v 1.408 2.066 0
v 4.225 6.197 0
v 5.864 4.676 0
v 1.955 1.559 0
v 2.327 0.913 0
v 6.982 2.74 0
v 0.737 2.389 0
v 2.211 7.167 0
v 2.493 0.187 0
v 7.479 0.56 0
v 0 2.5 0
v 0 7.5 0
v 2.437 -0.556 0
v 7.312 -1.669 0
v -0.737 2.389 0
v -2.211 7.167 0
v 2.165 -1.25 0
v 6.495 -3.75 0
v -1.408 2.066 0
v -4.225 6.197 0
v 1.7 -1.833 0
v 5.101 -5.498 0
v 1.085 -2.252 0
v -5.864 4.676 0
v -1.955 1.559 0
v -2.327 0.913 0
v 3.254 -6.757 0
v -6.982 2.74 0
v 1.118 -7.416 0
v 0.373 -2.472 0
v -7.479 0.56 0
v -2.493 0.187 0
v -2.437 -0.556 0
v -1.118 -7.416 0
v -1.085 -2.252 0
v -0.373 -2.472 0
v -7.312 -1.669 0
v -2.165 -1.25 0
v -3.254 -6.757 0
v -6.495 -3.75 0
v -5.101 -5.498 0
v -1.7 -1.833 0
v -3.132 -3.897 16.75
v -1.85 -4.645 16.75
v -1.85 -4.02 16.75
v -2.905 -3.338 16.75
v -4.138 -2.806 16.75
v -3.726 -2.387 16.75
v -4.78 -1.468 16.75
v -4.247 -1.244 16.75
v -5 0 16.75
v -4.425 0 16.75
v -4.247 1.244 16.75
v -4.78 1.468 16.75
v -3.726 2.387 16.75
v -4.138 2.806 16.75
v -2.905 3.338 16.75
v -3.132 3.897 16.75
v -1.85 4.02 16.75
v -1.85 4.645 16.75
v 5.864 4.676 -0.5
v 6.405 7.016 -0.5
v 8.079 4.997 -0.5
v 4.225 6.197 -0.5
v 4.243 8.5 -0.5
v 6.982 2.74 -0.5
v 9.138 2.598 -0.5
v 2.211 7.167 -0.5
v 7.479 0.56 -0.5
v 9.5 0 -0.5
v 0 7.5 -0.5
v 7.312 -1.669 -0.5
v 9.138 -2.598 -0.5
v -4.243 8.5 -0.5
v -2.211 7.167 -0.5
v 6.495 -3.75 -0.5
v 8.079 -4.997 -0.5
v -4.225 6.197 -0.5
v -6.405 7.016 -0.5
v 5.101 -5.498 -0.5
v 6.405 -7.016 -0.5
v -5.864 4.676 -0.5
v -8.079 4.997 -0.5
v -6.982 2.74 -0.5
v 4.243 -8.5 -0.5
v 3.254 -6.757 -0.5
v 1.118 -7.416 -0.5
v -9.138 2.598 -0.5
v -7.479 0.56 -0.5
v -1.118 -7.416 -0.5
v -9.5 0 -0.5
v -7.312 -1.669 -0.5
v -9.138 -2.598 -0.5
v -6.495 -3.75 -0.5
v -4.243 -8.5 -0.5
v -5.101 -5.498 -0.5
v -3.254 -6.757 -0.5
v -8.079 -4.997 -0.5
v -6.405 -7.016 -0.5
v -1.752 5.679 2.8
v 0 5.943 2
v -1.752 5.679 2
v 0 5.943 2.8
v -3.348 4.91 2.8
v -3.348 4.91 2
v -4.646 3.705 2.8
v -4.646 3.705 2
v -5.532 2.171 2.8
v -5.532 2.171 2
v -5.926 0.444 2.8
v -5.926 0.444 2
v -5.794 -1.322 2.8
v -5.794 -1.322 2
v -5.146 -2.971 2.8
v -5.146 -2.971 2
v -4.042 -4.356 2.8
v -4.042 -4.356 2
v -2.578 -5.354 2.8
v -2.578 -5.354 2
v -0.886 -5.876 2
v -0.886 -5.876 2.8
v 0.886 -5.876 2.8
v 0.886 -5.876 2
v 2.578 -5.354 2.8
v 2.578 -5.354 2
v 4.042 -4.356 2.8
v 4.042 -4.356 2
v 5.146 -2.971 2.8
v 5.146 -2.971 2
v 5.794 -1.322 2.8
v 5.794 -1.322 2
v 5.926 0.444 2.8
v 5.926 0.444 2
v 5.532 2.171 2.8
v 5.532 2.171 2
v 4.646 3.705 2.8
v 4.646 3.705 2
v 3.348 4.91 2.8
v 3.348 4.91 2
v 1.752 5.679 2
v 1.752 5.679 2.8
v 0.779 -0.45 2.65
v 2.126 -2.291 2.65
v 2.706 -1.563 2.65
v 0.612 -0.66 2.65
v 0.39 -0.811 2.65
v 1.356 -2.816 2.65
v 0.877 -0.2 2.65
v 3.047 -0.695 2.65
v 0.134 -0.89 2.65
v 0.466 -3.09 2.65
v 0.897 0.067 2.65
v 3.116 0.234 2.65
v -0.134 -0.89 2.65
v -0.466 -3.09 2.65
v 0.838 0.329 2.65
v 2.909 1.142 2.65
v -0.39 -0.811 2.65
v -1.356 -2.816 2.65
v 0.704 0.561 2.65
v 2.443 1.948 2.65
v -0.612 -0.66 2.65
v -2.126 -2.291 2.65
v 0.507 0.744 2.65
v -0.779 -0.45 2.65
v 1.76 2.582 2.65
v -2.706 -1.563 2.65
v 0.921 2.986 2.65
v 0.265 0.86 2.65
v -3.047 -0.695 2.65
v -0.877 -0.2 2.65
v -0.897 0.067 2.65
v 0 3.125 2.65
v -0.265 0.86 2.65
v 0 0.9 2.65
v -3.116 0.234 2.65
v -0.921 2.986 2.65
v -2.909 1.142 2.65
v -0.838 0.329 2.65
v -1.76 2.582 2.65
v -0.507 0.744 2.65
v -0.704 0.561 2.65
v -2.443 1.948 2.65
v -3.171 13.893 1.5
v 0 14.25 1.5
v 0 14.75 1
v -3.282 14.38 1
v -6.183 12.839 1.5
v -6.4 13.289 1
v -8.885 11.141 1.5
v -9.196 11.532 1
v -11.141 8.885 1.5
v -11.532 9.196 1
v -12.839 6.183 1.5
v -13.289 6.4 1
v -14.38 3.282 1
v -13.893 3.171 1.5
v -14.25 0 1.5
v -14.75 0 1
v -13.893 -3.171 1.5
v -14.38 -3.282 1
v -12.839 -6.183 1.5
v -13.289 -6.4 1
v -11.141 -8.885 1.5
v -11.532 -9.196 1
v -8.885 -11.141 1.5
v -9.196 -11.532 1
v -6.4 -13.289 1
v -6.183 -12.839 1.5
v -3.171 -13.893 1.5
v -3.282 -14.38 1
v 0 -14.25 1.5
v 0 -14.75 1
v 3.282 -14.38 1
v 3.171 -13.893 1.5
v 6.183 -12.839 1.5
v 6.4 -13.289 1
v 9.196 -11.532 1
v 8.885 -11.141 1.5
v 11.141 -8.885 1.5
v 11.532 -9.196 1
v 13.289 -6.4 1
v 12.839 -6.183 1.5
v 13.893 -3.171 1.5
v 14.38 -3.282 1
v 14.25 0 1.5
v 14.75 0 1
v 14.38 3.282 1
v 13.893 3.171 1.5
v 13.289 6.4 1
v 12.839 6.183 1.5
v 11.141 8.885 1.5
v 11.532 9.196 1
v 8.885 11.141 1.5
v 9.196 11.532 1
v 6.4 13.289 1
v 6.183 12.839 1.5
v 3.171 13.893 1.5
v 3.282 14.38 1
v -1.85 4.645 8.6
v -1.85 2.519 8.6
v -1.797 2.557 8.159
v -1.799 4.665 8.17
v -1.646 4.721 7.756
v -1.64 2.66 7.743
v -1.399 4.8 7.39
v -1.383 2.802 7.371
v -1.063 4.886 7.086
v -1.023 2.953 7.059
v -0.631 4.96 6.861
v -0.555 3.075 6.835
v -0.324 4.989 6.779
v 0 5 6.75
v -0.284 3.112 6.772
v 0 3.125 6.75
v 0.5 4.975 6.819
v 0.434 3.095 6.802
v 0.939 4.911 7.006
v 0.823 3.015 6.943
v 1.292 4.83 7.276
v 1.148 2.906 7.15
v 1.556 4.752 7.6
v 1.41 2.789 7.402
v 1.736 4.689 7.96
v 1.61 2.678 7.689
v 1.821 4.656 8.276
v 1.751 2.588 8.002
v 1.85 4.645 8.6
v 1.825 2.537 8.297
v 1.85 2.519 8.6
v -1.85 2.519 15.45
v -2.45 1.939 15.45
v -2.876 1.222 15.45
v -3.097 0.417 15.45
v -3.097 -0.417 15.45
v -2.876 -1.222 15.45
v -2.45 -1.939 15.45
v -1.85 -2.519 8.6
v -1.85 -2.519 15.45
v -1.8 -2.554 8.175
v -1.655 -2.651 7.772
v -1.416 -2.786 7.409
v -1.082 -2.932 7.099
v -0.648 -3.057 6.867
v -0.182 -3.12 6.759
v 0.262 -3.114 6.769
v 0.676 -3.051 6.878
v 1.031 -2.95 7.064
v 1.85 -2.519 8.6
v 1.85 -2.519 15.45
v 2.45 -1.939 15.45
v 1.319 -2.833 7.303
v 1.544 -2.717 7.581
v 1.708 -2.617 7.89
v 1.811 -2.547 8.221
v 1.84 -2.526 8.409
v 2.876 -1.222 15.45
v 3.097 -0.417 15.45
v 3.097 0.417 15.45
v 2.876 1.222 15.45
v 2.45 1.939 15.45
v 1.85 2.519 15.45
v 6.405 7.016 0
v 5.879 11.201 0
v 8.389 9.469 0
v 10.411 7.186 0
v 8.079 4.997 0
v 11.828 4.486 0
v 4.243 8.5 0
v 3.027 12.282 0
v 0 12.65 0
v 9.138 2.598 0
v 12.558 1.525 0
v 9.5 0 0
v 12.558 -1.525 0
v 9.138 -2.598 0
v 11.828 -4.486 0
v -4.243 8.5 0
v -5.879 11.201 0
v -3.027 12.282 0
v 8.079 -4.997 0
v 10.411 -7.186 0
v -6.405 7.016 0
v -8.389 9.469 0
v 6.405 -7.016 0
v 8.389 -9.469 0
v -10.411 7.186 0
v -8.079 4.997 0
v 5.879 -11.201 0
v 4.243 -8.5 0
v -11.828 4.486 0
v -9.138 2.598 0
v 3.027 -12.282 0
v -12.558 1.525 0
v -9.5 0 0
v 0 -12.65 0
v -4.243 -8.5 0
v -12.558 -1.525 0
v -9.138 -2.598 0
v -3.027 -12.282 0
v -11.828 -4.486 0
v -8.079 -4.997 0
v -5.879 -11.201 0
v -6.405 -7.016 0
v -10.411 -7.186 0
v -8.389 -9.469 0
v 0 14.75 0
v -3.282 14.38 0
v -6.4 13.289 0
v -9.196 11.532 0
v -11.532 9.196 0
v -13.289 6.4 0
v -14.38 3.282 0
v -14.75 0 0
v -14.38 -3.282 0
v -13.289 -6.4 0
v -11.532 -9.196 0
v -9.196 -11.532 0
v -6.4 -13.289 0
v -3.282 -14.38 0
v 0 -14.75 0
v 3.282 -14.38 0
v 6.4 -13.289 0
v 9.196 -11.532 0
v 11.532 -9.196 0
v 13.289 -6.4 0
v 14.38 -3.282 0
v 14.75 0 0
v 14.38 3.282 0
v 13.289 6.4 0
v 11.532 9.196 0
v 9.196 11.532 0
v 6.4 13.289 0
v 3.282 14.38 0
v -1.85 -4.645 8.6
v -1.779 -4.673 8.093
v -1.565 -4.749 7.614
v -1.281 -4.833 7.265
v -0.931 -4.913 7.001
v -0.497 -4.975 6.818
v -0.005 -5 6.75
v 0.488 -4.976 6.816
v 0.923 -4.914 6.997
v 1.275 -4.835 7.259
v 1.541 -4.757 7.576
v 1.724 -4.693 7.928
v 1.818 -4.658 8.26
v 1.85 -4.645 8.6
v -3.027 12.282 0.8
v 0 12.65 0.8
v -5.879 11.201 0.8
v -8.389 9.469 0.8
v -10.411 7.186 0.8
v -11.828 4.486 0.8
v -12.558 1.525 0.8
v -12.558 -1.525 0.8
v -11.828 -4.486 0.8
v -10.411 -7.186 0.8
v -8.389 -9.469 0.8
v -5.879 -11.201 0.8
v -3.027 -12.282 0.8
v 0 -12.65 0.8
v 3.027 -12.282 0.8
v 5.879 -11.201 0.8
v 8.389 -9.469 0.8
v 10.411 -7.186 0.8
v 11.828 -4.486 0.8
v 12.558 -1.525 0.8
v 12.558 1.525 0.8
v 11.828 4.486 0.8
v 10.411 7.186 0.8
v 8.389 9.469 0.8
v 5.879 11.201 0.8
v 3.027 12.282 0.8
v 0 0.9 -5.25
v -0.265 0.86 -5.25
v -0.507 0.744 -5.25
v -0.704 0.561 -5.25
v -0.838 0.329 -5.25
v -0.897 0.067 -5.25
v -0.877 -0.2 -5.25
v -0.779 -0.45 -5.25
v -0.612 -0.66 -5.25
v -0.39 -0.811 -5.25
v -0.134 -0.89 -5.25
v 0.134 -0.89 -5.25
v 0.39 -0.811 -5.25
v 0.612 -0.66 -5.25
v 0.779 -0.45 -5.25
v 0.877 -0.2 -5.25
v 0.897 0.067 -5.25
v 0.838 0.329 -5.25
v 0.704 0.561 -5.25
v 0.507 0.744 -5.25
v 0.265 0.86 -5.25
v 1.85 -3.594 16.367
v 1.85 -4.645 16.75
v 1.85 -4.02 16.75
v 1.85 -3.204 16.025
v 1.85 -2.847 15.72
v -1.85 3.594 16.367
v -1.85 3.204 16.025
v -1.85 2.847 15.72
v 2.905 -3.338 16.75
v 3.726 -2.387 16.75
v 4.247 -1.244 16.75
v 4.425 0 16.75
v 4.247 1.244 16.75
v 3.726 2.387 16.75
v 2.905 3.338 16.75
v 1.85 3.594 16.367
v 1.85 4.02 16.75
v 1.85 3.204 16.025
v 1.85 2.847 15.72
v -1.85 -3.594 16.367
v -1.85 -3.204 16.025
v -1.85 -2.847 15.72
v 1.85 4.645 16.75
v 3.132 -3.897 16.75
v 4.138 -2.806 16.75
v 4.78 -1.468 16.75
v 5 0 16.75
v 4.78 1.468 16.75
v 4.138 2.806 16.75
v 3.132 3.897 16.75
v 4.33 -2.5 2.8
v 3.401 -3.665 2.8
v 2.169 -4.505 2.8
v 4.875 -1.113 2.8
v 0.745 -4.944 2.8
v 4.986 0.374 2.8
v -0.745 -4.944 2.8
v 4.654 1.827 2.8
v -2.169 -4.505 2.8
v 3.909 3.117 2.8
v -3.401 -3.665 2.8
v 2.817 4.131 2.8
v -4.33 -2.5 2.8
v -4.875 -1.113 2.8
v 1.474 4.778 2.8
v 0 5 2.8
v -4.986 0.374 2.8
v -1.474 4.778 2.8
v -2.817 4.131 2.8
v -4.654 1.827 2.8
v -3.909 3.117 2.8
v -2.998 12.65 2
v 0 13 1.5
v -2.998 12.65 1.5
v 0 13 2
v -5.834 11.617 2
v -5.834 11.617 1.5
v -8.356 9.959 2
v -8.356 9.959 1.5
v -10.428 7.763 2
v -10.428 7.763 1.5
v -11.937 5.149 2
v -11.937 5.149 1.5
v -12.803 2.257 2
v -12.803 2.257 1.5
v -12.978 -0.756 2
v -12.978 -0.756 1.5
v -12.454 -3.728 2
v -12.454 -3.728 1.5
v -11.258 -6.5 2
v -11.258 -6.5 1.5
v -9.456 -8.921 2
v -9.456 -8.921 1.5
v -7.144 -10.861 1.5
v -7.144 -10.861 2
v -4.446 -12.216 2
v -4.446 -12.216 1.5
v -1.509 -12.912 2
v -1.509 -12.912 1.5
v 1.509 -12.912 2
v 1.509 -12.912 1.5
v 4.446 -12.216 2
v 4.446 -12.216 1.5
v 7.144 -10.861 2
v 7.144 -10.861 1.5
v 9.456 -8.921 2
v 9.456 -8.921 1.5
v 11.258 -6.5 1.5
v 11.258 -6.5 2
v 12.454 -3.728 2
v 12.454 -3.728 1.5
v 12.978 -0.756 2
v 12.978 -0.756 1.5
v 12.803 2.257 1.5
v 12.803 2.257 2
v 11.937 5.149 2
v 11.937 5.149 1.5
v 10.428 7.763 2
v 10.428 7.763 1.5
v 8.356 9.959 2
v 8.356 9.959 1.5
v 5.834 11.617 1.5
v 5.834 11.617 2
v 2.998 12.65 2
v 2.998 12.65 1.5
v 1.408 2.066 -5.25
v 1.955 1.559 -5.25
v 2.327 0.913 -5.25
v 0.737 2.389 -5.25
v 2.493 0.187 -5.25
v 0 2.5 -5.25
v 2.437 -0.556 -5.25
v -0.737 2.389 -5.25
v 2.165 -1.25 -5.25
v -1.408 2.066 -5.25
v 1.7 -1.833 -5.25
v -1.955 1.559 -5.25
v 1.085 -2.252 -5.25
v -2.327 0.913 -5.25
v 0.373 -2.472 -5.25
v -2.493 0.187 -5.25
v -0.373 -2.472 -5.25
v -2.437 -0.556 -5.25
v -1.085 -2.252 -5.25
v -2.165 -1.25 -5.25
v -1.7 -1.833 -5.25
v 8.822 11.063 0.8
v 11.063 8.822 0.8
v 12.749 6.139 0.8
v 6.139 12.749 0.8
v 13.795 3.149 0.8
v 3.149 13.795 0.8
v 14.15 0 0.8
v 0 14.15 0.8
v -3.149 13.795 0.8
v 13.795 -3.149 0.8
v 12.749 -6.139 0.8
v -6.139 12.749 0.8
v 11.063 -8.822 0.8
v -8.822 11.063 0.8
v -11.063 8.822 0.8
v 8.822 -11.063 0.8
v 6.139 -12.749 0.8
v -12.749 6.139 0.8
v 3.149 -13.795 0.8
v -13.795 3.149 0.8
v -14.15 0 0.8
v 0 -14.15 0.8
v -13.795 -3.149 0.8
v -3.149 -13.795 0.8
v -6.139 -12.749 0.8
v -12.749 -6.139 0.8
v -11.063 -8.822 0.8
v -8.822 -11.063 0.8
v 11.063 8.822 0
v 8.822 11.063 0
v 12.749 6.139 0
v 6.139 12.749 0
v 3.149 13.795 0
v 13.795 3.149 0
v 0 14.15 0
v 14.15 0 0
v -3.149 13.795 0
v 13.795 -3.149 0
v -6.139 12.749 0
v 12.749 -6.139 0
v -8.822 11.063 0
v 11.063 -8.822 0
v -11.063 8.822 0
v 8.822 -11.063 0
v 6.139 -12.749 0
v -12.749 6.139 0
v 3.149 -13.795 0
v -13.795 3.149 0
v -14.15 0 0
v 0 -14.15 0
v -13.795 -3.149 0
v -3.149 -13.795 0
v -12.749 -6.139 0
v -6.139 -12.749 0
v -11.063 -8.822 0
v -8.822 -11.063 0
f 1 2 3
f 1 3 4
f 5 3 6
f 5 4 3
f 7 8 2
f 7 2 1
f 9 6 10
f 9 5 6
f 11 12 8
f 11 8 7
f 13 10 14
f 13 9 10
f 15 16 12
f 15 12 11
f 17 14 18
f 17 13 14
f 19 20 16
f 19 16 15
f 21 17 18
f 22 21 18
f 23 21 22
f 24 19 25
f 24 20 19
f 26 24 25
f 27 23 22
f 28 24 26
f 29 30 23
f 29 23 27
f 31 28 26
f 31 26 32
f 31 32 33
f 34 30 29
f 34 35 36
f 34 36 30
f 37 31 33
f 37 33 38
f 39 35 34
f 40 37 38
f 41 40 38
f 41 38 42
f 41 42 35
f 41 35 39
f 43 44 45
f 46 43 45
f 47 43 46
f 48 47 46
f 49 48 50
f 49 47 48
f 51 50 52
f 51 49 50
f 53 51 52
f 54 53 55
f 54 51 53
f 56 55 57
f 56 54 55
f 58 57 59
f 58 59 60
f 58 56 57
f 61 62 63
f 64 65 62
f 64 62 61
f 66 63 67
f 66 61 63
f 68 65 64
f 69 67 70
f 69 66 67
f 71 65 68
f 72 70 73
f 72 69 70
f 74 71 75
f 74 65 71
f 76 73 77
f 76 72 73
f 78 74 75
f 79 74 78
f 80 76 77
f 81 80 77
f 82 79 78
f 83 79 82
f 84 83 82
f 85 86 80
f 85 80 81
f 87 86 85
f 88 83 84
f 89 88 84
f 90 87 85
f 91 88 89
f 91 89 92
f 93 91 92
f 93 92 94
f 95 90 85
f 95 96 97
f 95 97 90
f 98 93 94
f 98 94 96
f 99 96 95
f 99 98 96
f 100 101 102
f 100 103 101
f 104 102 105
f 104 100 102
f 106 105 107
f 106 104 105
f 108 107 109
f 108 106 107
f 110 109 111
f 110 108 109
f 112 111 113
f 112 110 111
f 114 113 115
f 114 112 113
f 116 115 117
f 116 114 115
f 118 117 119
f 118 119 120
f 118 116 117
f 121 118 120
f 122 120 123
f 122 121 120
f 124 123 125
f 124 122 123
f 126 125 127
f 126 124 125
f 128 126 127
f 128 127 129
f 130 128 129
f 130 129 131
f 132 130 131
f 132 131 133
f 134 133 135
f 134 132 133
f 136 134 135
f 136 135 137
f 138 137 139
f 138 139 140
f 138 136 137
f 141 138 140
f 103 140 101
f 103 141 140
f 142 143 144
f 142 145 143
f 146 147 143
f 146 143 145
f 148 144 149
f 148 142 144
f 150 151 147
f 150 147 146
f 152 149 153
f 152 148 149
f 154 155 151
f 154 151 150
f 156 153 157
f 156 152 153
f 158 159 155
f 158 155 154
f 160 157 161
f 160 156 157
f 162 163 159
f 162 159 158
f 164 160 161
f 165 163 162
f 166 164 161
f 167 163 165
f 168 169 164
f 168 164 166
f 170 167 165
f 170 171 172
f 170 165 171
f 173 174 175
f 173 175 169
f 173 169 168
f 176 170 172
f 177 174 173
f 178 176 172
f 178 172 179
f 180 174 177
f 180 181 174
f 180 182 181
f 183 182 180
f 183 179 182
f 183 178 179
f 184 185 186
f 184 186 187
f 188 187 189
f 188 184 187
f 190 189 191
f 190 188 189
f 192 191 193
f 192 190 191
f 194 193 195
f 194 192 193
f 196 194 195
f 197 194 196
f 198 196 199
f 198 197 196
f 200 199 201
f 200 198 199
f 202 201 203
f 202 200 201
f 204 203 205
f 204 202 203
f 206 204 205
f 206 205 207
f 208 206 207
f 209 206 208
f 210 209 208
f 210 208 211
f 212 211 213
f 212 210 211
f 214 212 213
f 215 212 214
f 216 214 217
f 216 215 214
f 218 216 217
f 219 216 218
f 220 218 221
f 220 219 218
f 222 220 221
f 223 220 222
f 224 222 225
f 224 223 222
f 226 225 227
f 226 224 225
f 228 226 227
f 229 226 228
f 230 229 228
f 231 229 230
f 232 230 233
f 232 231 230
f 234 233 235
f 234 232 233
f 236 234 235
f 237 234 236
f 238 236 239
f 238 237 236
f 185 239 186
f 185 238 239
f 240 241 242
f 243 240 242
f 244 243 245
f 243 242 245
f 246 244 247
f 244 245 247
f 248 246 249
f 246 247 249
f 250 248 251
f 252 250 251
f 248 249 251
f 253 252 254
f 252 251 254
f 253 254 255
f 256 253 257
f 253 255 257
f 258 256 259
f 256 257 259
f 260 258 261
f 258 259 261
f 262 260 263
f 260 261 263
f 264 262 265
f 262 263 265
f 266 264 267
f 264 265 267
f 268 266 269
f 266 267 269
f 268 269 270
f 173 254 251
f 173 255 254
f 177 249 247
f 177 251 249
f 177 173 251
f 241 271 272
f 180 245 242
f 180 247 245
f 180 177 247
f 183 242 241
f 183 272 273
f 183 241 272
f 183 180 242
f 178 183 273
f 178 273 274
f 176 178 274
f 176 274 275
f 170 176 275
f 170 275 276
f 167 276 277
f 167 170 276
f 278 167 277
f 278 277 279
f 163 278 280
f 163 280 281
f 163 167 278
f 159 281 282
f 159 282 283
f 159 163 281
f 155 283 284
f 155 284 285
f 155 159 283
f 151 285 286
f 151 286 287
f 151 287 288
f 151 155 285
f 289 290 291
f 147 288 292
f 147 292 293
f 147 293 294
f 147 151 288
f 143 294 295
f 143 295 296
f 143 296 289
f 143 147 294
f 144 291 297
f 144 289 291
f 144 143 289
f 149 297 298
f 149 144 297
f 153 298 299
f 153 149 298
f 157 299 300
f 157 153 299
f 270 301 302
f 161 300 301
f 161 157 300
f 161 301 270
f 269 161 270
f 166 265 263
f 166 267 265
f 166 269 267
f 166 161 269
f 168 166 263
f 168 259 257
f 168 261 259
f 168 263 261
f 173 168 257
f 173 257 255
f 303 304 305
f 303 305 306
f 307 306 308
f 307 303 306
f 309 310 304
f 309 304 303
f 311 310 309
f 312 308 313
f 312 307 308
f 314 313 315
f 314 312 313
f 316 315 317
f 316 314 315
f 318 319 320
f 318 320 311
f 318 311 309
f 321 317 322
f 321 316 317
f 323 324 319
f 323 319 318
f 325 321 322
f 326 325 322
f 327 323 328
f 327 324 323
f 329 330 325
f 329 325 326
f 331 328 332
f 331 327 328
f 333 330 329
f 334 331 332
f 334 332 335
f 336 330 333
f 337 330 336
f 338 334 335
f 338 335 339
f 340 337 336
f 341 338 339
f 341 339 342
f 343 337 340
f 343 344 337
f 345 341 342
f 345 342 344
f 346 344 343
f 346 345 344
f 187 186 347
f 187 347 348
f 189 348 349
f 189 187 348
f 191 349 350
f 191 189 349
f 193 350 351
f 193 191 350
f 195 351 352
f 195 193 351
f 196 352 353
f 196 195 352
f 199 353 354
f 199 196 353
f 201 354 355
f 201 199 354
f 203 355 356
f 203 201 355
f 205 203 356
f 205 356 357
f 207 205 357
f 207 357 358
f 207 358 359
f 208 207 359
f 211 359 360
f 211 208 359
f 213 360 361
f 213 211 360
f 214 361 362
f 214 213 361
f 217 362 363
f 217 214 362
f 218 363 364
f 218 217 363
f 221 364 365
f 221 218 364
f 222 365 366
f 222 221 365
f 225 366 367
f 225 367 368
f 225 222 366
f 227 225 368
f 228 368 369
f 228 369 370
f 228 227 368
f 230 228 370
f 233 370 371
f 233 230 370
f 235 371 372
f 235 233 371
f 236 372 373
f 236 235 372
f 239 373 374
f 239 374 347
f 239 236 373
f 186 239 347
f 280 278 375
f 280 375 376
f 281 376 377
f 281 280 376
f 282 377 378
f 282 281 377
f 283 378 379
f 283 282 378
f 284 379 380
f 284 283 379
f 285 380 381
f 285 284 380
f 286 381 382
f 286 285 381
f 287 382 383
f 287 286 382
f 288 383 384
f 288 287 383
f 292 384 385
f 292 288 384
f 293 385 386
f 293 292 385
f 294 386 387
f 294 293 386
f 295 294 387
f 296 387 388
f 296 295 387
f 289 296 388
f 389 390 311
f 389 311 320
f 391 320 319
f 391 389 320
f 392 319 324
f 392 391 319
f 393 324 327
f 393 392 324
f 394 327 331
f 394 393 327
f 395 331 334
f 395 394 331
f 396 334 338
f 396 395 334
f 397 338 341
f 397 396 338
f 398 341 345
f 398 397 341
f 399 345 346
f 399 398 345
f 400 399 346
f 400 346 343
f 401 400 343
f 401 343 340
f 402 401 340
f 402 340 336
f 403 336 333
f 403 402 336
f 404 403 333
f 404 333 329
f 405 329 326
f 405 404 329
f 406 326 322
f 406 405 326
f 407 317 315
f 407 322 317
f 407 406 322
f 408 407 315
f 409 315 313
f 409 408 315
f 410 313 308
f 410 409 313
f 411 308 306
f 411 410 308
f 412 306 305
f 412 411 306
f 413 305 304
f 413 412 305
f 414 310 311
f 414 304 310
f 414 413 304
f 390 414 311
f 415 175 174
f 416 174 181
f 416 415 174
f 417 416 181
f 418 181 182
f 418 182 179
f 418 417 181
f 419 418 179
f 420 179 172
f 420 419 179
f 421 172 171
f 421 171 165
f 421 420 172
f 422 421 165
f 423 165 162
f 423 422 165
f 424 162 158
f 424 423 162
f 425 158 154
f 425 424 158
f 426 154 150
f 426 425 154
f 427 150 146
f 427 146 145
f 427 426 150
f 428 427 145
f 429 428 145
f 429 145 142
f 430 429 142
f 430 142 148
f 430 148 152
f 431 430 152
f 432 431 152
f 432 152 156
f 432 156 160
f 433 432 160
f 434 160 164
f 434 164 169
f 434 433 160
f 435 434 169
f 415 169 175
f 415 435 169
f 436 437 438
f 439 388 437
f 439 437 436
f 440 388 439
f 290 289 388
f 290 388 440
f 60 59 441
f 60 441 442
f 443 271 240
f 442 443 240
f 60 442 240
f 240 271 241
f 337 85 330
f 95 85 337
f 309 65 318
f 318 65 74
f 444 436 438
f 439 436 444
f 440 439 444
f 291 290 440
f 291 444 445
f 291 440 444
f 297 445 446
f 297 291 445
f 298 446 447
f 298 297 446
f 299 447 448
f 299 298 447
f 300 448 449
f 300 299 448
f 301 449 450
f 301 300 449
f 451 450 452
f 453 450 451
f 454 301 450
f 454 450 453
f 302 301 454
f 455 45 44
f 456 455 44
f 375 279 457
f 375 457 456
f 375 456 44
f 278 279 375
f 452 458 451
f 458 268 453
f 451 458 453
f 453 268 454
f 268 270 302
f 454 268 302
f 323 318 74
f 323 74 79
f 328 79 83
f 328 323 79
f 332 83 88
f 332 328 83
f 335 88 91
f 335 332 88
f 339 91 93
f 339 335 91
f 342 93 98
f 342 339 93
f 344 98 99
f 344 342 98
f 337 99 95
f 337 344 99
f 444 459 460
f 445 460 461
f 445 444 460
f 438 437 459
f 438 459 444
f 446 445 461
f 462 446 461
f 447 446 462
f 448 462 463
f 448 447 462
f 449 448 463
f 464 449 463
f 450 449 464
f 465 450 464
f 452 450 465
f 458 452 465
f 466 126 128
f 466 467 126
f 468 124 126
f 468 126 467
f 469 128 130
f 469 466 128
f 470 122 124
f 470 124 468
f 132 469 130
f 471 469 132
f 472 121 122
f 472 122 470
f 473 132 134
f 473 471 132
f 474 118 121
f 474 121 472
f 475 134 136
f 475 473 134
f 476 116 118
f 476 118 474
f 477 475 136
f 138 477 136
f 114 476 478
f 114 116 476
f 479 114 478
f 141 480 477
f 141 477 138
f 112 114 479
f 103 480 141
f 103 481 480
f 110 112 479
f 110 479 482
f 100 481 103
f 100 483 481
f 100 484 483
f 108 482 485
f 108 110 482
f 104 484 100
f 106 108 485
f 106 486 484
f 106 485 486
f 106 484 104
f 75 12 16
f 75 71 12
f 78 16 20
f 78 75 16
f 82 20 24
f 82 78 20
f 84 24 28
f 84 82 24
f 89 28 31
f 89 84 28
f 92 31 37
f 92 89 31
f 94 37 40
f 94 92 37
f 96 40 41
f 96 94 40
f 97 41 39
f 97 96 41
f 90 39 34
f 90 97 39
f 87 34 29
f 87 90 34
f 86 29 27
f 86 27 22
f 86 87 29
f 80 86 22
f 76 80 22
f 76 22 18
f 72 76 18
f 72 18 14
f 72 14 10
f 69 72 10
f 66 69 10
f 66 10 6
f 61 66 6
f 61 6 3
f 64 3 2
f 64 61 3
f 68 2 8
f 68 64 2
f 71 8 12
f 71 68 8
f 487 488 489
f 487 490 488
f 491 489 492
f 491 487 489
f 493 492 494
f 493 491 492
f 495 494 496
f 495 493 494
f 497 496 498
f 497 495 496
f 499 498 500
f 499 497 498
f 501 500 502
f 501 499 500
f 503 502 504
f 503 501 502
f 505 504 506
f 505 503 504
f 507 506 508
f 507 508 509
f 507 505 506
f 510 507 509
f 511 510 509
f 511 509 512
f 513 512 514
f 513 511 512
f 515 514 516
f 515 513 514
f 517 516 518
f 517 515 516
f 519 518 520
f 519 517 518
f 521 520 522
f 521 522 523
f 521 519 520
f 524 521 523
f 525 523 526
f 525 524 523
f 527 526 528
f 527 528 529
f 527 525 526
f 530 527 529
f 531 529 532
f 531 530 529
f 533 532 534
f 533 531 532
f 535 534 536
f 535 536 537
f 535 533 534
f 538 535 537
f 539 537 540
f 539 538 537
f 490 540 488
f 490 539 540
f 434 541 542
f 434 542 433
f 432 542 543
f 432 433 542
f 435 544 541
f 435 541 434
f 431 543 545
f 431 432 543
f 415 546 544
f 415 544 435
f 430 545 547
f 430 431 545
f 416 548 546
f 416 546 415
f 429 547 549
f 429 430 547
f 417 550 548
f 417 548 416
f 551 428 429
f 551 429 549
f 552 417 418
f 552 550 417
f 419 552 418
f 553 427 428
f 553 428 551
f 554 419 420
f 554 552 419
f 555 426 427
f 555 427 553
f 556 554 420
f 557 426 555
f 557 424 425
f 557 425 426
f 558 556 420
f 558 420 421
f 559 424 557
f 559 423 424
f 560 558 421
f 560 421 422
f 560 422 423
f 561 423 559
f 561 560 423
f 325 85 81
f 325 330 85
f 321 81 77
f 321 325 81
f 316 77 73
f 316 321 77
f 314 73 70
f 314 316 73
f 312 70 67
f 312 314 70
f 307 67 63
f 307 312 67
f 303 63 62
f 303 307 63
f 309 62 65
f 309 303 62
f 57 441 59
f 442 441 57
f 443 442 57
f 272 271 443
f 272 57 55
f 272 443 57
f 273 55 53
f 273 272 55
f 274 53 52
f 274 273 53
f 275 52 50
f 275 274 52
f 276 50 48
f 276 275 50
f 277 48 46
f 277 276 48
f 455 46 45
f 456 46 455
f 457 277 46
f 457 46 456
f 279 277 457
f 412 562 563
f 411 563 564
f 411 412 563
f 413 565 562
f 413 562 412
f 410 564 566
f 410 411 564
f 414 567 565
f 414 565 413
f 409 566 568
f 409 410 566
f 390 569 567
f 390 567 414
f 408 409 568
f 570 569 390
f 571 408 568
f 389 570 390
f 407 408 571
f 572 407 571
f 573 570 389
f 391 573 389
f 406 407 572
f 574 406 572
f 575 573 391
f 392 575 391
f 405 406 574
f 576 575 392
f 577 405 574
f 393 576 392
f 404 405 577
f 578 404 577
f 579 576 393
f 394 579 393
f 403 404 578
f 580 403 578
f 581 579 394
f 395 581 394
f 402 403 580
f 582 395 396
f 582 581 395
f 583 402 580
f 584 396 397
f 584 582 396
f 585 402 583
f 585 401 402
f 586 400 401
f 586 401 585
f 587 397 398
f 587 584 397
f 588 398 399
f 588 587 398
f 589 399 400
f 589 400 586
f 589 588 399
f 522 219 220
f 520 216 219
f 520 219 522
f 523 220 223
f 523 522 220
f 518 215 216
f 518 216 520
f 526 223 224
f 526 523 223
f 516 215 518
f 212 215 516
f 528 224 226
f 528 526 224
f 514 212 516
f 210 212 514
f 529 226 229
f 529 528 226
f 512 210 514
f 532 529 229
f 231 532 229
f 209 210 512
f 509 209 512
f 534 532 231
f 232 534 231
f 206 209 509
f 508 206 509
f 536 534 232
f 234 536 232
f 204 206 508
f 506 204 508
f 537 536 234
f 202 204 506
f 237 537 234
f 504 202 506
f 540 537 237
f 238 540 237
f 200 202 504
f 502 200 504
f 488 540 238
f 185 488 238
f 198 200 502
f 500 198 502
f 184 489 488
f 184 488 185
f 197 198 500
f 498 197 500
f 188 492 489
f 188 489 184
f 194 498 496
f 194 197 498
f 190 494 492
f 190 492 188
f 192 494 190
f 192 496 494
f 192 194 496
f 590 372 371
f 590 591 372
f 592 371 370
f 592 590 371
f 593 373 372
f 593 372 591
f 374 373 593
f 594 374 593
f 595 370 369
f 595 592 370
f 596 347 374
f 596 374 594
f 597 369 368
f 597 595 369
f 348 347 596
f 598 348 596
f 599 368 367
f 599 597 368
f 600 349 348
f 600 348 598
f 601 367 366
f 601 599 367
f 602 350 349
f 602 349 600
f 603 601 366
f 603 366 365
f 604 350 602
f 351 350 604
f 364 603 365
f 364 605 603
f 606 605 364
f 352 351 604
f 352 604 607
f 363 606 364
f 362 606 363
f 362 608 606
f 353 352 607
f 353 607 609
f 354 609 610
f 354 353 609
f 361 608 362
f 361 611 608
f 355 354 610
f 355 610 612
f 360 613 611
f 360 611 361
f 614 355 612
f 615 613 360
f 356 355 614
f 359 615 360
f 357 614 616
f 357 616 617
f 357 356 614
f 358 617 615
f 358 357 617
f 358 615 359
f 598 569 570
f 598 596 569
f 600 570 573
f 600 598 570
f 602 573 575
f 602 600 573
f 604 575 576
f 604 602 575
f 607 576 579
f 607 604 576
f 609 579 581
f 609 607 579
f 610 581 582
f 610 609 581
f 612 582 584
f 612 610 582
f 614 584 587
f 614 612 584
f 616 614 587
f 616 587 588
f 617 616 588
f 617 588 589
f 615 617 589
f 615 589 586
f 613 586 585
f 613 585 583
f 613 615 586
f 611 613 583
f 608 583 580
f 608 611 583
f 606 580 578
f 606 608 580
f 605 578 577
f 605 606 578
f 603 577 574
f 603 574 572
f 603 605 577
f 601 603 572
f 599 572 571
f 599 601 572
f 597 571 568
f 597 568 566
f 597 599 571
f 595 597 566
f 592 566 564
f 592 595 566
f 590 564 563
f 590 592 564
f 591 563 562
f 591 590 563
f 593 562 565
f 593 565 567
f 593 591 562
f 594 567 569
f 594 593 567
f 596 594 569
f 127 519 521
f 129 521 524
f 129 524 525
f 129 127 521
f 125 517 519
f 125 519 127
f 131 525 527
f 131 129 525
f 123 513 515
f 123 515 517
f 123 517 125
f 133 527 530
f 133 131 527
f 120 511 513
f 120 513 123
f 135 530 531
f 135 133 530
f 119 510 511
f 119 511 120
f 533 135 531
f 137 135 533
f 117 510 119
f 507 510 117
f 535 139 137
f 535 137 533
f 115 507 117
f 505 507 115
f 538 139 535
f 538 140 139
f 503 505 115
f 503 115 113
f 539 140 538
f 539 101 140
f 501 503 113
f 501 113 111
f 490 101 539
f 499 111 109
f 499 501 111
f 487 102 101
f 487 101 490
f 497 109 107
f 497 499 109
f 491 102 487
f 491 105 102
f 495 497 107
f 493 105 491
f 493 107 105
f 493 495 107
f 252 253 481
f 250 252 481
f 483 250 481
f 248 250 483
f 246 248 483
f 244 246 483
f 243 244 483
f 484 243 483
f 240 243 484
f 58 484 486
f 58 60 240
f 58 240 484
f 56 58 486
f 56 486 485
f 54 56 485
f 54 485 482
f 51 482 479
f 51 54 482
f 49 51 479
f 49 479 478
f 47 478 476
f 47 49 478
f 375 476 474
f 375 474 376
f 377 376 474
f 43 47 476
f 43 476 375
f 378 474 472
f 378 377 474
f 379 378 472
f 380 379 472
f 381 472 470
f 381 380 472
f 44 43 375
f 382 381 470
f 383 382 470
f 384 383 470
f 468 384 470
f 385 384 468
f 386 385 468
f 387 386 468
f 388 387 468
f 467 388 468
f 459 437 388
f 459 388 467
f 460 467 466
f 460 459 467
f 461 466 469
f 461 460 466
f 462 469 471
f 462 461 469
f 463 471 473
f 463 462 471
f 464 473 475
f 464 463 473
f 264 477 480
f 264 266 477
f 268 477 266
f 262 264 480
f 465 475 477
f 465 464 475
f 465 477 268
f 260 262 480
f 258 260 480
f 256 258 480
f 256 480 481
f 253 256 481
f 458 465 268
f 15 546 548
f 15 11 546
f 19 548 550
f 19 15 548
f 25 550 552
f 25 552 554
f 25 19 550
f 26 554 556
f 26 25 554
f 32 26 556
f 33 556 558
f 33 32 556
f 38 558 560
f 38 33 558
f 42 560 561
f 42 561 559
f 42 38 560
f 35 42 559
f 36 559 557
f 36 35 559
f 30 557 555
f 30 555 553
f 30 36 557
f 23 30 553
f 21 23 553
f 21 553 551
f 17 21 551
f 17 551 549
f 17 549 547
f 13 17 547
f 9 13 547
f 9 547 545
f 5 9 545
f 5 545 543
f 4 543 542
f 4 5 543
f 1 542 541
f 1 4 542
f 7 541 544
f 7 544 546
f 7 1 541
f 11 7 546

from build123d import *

# Parameters (mm, degrees)
FASE1_SIZE                           = 0.5
FASE2_SIZE                           = 1.3
SCHNITT_LINEAR_AUSTRAGEN1_DEPTH      = 15.75
SCHNITT_LINEAR_AUSTRAGEN1_DEPTH_BACK = 15.75
SKIZZE4_OUTSIDE_W                    = 40.932
SKIZZE4_OUTSIDE_H                    = 40.932
SKIZZE4_OUTSIDE_W_2                  = 20
SKIZZE4_OUTSIDE_H_2                  = 17
SCHNITT_LINEAR_AUSTRAGEN2_DEPTH      = 0.5


with BuildPart() as part:
    # Skizze2 → Rotation1 (revolve)
    with BuildSketch(Plane(origin=(0, 0, 0), x_dir=(0, 0, -1), z_dir=(1, 0, 0))):
        Polygon((0, 14.75), (-1.5, 14.75), (-1.5, 13), (-2, 13), (-2, 5.942548531), (-2.8, 5.942548531), (-2.8, 5), (-16.75, 5), (-16.75, 3.125), (-2.65, 3.125), (-2.65, 0.9), (5.25, 0.9), (5.25, 2.5), (0, 2.5), (0, 7.5), (0.5, 7.5), (0.5, 9.5), (0, 9.5), (0, 12.65), (-0.8, 12.65), (-0.8, 14.15), (0, 14.15), align=None)
    revolve(axis=Axis((0, 0, -10.606367747), (0, 0, 1)))

    # Fase1
    fase1_edges = [part.edges().sort_by_distance(p)[0] for p in [
        (0, -14.75, 1.5),
    ]]
    chamfer(fase1_edges, length=FASE1_SIZE)

    # Fase2
    fase2_edges = [part.edges().sort_by_distance(p)[0] for p in [
        (0, -3.125, 16.75),
    ]]
    chamfer(fase2_edges, length=FASE2_SIZE)

    # Skizze3 → Schnitt-Linear austragen1 (cut, two sides)
    with BuildSketch(Plane(origin=(0, 0, 0), x_dir=(1, 0, 0), z_dir=(0, 1, 0))) as schnitt_linear_austragen1_sk:
        with BuildLine():
            Line((1.85, -8.6), (1.85, -16.75))
            ThreePointArc((1.85, -16.75), (0, -18.6), (-1.85, -16.75))
            Line((-1.85, -16.75), (-1.85, -8.6))
            ThreePointArc((-1.85, -8.6), (0, -6.75), (1.85, -8.6))
        make_face()
    extrude(amount=SCHNITT_LINEAR_AUSTRAGEN1_DEPTH, mode=Mode.SUBTRACT)
    extrude(schnitt_linear_austragen1_sk.sketch, amount=-SCHNITT_LINEAR_AUSTRAGEN1_DEPTH_BACK, mode=Mode.SUBTRACT)

    # Skizze4 outside → Schnitt-Linear austragen2 (cut)
    with BuildSketch(Plane(origin=(0, 0, -0.5), x_dir=(-1, 0, 0), z_dir=(0, 0, -1))):
        Rectangle(SKIZZE4_OUTSIDE_W, SKIZZE4_OUTSIDE_H)
        Rectangle(SKIZZE4_OUTSIDE_W_2, SKIZZE4_OUTSIDE_H_2, mode=Mode.SUBTRACT)
    extrude(amount=-SCHNITT_LINEAR_AUSTRAGEN2_DEPTH, mode=Mode.SUBTRACT)


solid = part.part
